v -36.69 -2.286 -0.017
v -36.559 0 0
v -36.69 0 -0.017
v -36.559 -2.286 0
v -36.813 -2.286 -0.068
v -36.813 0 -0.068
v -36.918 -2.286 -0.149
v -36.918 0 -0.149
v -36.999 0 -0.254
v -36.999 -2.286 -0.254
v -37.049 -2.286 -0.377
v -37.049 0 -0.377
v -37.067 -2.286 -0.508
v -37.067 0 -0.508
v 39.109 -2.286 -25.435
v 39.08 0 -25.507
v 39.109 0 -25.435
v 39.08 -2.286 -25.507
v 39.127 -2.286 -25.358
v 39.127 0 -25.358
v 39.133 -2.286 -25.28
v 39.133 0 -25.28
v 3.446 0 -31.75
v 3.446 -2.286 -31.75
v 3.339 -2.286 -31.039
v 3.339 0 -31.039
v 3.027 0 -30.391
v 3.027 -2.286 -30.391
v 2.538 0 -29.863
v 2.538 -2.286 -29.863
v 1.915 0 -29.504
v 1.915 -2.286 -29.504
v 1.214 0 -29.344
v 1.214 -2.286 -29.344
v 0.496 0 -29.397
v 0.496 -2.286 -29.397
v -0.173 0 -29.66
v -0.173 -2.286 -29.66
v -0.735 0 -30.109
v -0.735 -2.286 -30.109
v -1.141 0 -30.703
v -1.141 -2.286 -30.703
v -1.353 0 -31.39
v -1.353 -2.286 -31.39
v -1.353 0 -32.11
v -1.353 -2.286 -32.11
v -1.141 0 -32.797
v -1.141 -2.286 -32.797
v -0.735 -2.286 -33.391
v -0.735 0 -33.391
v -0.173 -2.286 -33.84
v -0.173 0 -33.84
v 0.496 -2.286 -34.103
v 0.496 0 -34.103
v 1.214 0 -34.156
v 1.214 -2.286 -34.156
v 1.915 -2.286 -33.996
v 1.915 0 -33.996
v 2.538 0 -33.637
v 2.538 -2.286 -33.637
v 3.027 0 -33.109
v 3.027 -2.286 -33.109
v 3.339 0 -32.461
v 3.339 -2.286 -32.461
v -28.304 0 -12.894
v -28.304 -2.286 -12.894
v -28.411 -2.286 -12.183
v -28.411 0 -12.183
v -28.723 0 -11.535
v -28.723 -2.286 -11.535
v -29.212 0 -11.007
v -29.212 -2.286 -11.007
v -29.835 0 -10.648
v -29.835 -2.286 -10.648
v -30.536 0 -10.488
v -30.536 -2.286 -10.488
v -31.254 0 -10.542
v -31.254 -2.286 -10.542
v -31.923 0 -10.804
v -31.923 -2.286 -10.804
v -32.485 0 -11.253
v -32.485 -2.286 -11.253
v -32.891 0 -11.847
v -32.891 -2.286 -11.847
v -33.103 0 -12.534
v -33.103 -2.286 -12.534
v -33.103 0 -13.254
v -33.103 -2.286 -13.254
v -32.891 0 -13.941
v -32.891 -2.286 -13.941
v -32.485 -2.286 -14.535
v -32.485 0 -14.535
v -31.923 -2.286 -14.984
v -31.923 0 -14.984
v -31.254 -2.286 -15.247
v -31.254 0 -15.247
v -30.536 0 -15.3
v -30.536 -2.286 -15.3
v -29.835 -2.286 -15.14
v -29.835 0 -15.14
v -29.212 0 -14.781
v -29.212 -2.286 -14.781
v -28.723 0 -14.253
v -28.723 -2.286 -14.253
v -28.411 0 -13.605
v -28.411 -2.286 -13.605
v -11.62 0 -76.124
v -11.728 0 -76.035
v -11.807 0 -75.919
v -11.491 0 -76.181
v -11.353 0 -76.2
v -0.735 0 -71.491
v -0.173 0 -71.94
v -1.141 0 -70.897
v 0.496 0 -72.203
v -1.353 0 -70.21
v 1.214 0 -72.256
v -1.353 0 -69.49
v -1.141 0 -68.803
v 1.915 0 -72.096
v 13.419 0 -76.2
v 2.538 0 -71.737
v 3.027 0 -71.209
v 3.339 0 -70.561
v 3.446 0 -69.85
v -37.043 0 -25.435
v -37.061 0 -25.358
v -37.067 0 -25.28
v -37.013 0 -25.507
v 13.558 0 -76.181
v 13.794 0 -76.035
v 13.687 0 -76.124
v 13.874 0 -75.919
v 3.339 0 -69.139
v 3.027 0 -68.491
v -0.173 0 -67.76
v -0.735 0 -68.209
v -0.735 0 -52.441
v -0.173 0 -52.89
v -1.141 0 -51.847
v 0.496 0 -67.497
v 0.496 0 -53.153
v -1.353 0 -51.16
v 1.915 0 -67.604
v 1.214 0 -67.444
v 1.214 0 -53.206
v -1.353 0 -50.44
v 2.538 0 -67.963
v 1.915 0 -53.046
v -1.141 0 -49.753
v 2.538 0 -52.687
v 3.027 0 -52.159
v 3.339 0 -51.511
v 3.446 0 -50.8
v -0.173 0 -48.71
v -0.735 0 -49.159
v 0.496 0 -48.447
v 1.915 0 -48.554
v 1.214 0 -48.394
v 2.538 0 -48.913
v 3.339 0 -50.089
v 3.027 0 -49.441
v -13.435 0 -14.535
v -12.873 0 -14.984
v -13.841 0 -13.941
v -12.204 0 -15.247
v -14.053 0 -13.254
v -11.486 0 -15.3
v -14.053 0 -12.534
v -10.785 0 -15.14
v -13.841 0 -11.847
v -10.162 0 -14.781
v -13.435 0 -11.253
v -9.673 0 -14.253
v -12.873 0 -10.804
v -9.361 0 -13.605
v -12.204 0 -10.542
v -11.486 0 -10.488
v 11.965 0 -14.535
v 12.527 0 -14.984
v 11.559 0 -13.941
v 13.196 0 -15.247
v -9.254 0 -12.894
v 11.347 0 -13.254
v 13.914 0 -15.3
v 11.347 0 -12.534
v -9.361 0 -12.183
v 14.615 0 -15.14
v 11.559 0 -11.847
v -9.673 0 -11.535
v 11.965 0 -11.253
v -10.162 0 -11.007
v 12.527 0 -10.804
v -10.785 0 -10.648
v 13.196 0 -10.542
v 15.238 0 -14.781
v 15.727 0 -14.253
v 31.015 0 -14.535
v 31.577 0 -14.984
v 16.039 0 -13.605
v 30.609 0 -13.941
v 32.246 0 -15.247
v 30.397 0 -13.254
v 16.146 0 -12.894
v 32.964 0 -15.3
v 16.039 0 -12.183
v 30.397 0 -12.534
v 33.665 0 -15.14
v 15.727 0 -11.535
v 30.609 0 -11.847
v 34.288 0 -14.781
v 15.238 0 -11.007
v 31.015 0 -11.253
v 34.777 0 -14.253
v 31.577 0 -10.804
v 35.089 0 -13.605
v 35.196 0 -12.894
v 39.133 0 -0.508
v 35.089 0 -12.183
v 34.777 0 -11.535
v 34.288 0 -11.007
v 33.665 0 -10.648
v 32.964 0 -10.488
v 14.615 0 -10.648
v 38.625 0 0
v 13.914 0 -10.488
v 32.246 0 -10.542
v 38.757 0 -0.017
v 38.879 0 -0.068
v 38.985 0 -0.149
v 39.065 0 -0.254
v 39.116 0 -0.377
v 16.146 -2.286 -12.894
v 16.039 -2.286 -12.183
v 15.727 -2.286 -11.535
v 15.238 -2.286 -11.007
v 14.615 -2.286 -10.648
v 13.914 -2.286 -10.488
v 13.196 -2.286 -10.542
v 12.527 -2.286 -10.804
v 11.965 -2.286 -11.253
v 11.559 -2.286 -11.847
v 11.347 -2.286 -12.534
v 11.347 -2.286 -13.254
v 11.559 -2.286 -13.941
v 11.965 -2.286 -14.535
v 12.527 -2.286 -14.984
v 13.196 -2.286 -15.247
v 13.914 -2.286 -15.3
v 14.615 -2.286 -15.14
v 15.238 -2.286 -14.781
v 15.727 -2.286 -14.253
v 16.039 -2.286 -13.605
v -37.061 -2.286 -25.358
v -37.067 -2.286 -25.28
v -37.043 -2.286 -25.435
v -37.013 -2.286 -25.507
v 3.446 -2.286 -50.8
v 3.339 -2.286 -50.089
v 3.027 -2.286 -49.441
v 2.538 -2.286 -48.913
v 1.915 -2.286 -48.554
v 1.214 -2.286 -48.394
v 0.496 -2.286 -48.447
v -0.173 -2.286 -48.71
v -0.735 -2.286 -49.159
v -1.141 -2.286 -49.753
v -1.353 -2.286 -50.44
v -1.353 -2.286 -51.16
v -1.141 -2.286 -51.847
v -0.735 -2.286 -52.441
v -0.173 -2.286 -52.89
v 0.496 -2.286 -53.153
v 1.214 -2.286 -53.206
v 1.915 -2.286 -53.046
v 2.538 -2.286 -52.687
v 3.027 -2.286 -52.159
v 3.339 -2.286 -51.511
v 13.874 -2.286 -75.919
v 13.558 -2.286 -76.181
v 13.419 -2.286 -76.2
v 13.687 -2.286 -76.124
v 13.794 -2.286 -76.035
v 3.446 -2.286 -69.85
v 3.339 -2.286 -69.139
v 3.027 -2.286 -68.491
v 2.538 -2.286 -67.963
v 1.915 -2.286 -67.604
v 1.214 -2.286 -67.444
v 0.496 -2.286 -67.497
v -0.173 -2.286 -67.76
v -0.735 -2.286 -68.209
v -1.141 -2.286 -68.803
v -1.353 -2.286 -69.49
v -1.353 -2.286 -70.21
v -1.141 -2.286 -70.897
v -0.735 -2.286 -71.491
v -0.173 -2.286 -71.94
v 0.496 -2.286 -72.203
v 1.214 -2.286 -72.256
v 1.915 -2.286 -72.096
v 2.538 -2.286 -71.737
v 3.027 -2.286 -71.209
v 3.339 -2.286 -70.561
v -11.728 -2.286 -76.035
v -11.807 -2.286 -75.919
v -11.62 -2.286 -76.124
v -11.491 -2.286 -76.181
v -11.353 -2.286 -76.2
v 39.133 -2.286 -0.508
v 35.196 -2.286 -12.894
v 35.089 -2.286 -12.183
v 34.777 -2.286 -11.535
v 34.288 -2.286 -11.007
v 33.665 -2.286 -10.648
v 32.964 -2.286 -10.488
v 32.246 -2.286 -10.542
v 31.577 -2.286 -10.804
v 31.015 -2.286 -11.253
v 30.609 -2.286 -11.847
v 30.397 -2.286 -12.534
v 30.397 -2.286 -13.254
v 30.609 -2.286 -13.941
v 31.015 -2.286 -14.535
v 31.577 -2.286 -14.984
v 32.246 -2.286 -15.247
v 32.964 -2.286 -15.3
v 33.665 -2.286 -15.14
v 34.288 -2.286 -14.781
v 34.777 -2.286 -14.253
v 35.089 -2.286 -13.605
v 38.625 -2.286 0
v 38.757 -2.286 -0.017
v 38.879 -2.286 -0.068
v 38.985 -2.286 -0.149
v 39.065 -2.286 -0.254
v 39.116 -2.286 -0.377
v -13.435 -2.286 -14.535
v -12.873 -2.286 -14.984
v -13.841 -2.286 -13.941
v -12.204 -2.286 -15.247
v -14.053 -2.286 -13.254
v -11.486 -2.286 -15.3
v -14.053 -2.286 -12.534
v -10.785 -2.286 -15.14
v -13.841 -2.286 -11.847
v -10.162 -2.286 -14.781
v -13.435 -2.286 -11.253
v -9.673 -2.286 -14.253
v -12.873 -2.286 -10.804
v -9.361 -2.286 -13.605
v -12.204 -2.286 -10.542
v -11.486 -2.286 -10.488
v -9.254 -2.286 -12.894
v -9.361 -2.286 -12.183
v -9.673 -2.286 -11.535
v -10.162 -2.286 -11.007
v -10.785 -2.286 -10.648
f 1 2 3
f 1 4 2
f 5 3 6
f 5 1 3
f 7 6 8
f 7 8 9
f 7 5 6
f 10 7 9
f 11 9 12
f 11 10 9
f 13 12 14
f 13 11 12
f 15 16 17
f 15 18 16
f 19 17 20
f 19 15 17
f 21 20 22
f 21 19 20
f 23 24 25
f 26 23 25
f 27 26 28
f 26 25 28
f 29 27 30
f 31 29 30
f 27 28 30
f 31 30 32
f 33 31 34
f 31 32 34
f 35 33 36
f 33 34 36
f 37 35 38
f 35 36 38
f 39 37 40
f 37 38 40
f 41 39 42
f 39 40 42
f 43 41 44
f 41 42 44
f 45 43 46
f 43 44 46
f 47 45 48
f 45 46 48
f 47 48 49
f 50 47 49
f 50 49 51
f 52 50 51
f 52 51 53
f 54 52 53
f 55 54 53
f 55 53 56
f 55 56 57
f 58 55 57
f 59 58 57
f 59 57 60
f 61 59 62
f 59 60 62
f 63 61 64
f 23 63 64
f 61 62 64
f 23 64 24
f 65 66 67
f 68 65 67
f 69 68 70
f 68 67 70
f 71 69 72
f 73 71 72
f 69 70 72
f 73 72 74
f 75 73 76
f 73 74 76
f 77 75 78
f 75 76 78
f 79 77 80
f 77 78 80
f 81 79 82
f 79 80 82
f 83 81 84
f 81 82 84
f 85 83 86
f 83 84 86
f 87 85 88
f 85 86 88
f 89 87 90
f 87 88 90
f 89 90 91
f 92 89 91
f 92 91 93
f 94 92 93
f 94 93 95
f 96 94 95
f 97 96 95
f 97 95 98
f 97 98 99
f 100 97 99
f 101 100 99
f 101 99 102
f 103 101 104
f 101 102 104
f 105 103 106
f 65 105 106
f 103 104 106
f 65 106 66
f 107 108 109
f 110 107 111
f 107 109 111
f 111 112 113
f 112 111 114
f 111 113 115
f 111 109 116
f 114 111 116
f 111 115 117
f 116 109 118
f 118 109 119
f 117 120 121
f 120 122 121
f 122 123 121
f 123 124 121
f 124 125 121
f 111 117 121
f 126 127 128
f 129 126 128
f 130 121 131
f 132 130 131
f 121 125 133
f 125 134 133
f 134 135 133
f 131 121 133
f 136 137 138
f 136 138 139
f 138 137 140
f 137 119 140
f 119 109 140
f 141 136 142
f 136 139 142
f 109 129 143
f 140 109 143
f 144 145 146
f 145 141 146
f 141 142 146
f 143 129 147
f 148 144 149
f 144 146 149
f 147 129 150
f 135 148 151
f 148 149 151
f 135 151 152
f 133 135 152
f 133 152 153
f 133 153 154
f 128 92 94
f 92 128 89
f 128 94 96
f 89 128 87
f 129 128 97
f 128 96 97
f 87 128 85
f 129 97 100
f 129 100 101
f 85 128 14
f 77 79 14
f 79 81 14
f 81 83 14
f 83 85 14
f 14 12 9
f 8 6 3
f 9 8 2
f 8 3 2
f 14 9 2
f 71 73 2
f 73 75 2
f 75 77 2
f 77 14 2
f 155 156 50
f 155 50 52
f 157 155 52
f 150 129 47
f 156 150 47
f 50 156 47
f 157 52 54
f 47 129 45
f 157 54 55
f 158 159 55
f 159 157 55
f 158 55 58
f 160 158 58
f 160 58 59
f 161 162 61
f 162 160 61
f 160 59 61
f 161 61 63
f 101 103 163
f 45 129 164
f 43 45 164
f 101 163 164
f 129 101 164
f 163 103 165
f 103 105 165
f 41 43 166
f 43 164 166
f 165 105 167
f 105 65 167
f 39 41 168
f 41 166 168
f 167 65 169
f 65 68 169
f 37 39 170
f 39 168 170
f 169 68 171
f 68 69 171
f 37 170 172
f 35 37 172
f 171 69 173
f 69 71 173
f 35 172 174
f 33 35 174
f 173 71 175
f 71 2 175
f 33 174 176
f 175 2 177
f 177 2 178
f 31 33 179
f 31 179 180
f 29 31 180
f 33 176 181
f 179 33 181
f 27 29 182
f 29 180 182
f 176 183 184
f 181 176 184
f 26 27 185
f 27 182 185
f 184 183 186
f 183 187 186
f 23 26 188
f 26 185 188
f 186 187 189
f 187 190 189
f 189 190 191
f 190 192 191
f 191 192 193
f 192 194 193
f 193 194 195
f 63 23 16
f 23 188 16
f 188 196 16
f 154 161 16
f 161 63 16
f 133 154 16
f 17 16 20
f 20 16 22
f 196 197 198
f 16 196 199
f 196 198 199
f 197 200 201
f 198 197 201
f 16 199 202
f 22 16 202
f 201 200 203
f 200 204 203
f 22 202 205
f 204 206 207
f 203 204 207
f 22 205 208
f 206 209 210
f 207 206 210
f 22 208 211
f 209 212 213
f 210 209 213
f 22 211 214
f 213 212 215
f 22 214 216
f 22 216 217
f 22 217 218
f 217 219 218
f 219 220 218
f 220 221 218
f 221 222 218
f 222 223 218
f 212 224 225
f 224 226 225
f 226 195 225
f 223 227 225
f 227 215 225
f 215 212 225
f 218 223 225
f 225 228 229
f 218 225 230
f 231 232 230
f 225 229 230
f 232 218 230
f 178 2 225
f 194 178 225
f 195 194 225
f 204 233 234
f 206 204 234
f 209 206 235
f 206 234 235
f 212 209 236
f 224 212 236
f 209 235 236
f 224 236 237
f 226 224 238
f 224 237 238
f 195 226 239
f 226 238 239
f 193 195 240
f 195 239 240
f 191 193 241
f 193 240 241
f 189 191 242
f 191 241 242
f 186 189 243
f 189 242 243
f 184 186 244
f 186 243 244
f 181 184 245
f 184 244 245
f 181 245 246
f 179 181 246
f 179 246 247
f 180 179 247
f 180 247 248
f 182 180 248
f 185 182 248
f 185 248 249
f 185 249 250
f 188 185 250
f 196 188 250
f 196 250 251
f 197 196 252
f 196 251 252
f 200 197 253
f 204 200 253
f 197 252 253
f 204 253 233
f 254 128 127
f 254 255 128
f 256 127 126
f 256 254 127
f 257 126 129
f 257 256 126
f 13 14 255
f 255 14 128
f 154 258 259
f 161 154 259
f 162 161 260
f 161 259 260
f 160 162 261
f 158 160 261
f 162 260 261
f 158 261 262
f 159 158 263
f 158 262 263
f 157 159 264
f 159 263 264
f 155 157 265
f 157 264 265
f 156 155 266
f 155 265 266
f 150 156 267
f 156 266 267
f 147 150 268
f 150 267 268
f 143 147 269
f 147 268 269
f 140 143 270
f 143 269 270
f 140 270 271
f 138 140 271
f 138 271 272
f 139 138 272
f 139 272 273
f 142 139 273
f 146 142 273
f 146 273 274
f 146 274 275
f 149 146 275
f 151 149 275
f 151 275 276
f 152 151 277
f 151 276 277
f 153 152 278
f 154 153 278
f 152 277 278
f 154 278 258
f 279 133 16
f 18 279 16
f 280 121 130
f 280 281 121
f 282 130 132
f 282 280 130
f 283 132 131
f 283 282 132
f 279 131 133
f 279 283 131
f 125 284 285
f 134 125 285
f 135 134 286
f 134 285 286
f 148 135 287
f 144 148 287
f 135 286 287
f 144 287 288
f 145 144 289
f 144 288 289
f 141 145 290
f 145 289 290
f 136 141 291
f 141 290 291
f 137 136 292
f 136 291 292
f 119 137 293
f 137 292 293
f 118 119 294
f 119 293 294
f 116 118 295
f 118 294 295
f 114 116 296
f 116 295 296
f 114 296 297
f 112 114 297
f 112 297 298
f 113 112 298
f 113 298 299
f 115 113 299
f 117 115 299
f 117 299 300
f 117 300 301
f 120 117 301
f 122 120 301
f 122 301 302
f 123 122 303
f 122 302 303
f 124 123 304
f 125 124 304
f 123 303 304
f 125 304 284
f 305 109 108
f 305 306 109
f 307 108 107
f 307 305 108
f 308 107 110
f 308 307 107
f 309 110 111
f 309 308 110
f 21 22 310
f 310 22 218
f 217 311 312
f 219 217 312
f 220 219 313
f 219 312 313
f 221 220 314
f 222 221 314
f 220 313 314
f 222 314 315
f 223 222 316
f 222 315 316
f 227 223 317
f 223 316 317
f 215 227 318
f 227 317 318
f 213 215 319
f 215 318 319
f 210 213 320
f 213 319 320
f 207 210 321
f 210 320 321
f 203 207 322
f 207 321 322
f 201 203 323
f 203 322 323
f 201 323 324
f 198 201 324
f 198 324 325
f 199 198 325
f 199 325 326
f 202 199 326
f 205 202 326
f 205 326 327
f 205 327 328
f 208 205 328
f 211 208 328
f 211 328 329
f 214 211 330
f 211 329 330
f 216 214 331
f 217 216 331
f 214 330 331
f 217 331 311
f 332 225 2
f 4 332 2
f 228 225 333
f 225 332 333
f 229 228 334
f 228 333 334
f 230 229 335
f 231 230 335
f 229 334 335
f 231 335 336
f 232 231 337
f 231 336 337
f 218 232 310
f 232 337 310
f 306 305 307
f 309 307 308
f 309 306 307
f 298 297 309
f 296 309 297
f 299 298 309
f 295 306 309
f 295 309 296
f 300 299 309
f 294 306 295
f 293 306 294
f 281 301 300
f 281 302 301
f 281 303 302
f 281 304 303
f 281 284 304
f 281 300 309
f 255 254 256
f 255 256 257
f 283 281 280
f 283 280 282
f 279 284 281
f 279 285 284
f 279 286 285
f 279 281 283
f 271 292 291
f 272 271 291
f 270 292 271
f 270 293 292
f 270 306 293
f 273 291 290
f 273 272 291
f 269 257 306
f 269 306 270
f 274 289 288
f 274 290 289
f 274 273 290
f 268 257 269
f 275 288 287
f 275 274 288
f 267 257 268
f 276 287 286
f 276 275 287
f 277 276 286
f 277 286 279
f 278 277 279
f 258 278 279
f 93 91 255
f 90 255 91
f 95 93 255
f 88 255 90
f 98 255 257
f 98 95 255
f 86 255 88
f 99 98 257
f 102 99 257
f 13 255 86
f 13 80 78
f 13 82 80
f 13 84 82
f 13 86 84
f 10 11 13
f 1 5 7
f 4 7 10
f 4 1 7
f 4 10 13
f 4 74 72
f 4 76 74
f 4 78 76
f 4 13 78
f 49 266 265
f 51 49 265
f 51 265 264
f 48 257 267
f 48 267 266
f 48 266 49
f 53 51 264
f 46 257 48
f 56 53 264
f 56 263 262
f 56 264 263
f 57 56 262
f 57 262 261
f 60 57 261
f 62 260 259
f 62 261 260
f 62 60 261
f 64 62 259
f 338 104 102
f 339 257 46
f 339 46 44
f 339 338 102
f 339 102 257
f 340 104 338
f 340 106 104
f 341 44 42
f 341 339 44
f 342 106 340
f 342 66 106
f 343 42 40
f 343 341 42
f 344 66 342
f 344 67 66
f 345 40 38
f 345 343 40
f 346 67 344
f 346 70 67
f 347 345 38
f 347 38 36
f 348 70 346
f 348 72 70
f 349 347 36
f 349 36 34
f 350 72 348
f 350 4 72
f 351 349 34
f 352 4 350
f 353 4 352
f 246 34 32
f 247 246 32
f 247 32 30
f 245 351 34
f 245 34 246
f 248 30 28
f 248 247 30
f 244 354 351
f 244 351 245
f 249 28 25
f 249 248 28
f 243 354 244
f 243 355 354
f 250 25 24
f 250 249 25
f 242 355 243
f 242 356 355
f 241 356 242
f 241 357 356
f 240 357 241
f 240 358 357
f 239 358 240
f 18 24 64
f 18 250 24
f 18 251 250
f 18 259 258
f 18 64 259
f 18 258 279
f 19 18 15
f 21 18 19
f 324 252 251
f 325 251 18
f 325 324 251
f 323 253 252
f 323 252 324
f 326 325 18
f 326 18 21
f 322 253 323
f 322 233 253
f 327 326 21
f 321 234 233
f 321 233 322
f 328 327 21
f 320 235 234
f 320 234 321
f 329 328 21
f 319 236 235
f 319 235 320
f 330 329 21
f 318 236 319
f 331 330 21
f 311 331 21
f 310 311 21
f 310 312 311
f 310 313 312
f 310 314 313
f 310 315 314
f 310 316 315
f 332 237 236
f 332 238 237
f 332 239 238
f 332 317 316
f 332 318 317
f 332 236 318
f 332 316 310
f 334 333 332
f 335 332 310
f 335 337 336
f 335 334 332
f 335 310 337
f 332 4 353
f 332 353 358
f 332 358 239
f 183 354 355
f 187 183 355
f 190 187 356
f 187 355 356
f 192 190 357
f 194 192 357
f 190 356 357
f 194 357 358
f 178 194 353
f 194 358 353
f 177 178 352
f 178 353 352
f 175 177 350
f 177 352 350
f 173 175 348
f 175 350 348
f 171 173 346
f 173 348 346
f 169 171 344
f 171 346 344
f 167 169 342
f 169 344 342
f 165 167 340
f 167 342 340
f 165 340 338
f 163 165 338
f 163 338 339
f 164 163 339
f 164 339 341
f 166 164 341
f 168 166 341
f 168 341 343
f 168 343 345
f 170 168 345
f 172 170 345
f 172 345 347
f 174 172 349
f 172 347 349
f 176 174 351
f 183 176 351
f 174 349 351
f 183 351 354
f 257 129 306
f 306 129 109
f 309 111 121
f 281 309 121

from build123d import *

# Parameters (mm, degrees)
F1_DEPTH = 2.286
F2_R     = 0.508
F3_R     = 2.413
F4_DEPTH = 2.286


with BuildPart() as f1:
    # F0 (on Front) → F1 (new body)
    with BuildSketch(Plane.XZ):
        Polygon((39.133413, 0), (-37.066587, 0), (-37.066587, -25.4), (-11.666587, -76.2), (13.733413, -76.2), (39.133413, -25.4), align=None)
    extrude(amount=F1_DEPTH)

    # F2
    f2_edges = [f1.edges().sort_by_distance(p)[0] for p in [
        (-37.066587, -1.143, 0),
        (-37.066587, -1.143, -25.4),
        (39.133413, -1.143, 0),
        (39.133413, -1.143, -25.4),
        (13.733413, -1.143, -76.2),
        (-11.666587, -1.143, -76.2),
    ]]
    fillet(f2_edges, radius=F2_R)

    # F3 (on face) → F4 (cut)
    with BuildSketch(Plane.XZ.offset(2.286)):
        with Locations((-30.716587, -12.894039)):
            Circle(F3_R)
        with Locations((-11.666587, -12.894039)):
            Circle(F3_R)
        with Locations((13.733413, -12.894039)):
            Circle(F3_R)
        with Locations((32.783413, -12.894039)):
            Circle(F3_R)
        with Locations((1.033413, -31.75)):
            Circle(F3_R)
        with Locations((1.033413, -50.8)):
            Circle(F3_R)
        with Locations((1.033413, -69.85)):
            Circle(F3_R)
    extrude(amount=-F4_DEPTH, mode=Mode.SUBTRACT)


solid = f1.part
